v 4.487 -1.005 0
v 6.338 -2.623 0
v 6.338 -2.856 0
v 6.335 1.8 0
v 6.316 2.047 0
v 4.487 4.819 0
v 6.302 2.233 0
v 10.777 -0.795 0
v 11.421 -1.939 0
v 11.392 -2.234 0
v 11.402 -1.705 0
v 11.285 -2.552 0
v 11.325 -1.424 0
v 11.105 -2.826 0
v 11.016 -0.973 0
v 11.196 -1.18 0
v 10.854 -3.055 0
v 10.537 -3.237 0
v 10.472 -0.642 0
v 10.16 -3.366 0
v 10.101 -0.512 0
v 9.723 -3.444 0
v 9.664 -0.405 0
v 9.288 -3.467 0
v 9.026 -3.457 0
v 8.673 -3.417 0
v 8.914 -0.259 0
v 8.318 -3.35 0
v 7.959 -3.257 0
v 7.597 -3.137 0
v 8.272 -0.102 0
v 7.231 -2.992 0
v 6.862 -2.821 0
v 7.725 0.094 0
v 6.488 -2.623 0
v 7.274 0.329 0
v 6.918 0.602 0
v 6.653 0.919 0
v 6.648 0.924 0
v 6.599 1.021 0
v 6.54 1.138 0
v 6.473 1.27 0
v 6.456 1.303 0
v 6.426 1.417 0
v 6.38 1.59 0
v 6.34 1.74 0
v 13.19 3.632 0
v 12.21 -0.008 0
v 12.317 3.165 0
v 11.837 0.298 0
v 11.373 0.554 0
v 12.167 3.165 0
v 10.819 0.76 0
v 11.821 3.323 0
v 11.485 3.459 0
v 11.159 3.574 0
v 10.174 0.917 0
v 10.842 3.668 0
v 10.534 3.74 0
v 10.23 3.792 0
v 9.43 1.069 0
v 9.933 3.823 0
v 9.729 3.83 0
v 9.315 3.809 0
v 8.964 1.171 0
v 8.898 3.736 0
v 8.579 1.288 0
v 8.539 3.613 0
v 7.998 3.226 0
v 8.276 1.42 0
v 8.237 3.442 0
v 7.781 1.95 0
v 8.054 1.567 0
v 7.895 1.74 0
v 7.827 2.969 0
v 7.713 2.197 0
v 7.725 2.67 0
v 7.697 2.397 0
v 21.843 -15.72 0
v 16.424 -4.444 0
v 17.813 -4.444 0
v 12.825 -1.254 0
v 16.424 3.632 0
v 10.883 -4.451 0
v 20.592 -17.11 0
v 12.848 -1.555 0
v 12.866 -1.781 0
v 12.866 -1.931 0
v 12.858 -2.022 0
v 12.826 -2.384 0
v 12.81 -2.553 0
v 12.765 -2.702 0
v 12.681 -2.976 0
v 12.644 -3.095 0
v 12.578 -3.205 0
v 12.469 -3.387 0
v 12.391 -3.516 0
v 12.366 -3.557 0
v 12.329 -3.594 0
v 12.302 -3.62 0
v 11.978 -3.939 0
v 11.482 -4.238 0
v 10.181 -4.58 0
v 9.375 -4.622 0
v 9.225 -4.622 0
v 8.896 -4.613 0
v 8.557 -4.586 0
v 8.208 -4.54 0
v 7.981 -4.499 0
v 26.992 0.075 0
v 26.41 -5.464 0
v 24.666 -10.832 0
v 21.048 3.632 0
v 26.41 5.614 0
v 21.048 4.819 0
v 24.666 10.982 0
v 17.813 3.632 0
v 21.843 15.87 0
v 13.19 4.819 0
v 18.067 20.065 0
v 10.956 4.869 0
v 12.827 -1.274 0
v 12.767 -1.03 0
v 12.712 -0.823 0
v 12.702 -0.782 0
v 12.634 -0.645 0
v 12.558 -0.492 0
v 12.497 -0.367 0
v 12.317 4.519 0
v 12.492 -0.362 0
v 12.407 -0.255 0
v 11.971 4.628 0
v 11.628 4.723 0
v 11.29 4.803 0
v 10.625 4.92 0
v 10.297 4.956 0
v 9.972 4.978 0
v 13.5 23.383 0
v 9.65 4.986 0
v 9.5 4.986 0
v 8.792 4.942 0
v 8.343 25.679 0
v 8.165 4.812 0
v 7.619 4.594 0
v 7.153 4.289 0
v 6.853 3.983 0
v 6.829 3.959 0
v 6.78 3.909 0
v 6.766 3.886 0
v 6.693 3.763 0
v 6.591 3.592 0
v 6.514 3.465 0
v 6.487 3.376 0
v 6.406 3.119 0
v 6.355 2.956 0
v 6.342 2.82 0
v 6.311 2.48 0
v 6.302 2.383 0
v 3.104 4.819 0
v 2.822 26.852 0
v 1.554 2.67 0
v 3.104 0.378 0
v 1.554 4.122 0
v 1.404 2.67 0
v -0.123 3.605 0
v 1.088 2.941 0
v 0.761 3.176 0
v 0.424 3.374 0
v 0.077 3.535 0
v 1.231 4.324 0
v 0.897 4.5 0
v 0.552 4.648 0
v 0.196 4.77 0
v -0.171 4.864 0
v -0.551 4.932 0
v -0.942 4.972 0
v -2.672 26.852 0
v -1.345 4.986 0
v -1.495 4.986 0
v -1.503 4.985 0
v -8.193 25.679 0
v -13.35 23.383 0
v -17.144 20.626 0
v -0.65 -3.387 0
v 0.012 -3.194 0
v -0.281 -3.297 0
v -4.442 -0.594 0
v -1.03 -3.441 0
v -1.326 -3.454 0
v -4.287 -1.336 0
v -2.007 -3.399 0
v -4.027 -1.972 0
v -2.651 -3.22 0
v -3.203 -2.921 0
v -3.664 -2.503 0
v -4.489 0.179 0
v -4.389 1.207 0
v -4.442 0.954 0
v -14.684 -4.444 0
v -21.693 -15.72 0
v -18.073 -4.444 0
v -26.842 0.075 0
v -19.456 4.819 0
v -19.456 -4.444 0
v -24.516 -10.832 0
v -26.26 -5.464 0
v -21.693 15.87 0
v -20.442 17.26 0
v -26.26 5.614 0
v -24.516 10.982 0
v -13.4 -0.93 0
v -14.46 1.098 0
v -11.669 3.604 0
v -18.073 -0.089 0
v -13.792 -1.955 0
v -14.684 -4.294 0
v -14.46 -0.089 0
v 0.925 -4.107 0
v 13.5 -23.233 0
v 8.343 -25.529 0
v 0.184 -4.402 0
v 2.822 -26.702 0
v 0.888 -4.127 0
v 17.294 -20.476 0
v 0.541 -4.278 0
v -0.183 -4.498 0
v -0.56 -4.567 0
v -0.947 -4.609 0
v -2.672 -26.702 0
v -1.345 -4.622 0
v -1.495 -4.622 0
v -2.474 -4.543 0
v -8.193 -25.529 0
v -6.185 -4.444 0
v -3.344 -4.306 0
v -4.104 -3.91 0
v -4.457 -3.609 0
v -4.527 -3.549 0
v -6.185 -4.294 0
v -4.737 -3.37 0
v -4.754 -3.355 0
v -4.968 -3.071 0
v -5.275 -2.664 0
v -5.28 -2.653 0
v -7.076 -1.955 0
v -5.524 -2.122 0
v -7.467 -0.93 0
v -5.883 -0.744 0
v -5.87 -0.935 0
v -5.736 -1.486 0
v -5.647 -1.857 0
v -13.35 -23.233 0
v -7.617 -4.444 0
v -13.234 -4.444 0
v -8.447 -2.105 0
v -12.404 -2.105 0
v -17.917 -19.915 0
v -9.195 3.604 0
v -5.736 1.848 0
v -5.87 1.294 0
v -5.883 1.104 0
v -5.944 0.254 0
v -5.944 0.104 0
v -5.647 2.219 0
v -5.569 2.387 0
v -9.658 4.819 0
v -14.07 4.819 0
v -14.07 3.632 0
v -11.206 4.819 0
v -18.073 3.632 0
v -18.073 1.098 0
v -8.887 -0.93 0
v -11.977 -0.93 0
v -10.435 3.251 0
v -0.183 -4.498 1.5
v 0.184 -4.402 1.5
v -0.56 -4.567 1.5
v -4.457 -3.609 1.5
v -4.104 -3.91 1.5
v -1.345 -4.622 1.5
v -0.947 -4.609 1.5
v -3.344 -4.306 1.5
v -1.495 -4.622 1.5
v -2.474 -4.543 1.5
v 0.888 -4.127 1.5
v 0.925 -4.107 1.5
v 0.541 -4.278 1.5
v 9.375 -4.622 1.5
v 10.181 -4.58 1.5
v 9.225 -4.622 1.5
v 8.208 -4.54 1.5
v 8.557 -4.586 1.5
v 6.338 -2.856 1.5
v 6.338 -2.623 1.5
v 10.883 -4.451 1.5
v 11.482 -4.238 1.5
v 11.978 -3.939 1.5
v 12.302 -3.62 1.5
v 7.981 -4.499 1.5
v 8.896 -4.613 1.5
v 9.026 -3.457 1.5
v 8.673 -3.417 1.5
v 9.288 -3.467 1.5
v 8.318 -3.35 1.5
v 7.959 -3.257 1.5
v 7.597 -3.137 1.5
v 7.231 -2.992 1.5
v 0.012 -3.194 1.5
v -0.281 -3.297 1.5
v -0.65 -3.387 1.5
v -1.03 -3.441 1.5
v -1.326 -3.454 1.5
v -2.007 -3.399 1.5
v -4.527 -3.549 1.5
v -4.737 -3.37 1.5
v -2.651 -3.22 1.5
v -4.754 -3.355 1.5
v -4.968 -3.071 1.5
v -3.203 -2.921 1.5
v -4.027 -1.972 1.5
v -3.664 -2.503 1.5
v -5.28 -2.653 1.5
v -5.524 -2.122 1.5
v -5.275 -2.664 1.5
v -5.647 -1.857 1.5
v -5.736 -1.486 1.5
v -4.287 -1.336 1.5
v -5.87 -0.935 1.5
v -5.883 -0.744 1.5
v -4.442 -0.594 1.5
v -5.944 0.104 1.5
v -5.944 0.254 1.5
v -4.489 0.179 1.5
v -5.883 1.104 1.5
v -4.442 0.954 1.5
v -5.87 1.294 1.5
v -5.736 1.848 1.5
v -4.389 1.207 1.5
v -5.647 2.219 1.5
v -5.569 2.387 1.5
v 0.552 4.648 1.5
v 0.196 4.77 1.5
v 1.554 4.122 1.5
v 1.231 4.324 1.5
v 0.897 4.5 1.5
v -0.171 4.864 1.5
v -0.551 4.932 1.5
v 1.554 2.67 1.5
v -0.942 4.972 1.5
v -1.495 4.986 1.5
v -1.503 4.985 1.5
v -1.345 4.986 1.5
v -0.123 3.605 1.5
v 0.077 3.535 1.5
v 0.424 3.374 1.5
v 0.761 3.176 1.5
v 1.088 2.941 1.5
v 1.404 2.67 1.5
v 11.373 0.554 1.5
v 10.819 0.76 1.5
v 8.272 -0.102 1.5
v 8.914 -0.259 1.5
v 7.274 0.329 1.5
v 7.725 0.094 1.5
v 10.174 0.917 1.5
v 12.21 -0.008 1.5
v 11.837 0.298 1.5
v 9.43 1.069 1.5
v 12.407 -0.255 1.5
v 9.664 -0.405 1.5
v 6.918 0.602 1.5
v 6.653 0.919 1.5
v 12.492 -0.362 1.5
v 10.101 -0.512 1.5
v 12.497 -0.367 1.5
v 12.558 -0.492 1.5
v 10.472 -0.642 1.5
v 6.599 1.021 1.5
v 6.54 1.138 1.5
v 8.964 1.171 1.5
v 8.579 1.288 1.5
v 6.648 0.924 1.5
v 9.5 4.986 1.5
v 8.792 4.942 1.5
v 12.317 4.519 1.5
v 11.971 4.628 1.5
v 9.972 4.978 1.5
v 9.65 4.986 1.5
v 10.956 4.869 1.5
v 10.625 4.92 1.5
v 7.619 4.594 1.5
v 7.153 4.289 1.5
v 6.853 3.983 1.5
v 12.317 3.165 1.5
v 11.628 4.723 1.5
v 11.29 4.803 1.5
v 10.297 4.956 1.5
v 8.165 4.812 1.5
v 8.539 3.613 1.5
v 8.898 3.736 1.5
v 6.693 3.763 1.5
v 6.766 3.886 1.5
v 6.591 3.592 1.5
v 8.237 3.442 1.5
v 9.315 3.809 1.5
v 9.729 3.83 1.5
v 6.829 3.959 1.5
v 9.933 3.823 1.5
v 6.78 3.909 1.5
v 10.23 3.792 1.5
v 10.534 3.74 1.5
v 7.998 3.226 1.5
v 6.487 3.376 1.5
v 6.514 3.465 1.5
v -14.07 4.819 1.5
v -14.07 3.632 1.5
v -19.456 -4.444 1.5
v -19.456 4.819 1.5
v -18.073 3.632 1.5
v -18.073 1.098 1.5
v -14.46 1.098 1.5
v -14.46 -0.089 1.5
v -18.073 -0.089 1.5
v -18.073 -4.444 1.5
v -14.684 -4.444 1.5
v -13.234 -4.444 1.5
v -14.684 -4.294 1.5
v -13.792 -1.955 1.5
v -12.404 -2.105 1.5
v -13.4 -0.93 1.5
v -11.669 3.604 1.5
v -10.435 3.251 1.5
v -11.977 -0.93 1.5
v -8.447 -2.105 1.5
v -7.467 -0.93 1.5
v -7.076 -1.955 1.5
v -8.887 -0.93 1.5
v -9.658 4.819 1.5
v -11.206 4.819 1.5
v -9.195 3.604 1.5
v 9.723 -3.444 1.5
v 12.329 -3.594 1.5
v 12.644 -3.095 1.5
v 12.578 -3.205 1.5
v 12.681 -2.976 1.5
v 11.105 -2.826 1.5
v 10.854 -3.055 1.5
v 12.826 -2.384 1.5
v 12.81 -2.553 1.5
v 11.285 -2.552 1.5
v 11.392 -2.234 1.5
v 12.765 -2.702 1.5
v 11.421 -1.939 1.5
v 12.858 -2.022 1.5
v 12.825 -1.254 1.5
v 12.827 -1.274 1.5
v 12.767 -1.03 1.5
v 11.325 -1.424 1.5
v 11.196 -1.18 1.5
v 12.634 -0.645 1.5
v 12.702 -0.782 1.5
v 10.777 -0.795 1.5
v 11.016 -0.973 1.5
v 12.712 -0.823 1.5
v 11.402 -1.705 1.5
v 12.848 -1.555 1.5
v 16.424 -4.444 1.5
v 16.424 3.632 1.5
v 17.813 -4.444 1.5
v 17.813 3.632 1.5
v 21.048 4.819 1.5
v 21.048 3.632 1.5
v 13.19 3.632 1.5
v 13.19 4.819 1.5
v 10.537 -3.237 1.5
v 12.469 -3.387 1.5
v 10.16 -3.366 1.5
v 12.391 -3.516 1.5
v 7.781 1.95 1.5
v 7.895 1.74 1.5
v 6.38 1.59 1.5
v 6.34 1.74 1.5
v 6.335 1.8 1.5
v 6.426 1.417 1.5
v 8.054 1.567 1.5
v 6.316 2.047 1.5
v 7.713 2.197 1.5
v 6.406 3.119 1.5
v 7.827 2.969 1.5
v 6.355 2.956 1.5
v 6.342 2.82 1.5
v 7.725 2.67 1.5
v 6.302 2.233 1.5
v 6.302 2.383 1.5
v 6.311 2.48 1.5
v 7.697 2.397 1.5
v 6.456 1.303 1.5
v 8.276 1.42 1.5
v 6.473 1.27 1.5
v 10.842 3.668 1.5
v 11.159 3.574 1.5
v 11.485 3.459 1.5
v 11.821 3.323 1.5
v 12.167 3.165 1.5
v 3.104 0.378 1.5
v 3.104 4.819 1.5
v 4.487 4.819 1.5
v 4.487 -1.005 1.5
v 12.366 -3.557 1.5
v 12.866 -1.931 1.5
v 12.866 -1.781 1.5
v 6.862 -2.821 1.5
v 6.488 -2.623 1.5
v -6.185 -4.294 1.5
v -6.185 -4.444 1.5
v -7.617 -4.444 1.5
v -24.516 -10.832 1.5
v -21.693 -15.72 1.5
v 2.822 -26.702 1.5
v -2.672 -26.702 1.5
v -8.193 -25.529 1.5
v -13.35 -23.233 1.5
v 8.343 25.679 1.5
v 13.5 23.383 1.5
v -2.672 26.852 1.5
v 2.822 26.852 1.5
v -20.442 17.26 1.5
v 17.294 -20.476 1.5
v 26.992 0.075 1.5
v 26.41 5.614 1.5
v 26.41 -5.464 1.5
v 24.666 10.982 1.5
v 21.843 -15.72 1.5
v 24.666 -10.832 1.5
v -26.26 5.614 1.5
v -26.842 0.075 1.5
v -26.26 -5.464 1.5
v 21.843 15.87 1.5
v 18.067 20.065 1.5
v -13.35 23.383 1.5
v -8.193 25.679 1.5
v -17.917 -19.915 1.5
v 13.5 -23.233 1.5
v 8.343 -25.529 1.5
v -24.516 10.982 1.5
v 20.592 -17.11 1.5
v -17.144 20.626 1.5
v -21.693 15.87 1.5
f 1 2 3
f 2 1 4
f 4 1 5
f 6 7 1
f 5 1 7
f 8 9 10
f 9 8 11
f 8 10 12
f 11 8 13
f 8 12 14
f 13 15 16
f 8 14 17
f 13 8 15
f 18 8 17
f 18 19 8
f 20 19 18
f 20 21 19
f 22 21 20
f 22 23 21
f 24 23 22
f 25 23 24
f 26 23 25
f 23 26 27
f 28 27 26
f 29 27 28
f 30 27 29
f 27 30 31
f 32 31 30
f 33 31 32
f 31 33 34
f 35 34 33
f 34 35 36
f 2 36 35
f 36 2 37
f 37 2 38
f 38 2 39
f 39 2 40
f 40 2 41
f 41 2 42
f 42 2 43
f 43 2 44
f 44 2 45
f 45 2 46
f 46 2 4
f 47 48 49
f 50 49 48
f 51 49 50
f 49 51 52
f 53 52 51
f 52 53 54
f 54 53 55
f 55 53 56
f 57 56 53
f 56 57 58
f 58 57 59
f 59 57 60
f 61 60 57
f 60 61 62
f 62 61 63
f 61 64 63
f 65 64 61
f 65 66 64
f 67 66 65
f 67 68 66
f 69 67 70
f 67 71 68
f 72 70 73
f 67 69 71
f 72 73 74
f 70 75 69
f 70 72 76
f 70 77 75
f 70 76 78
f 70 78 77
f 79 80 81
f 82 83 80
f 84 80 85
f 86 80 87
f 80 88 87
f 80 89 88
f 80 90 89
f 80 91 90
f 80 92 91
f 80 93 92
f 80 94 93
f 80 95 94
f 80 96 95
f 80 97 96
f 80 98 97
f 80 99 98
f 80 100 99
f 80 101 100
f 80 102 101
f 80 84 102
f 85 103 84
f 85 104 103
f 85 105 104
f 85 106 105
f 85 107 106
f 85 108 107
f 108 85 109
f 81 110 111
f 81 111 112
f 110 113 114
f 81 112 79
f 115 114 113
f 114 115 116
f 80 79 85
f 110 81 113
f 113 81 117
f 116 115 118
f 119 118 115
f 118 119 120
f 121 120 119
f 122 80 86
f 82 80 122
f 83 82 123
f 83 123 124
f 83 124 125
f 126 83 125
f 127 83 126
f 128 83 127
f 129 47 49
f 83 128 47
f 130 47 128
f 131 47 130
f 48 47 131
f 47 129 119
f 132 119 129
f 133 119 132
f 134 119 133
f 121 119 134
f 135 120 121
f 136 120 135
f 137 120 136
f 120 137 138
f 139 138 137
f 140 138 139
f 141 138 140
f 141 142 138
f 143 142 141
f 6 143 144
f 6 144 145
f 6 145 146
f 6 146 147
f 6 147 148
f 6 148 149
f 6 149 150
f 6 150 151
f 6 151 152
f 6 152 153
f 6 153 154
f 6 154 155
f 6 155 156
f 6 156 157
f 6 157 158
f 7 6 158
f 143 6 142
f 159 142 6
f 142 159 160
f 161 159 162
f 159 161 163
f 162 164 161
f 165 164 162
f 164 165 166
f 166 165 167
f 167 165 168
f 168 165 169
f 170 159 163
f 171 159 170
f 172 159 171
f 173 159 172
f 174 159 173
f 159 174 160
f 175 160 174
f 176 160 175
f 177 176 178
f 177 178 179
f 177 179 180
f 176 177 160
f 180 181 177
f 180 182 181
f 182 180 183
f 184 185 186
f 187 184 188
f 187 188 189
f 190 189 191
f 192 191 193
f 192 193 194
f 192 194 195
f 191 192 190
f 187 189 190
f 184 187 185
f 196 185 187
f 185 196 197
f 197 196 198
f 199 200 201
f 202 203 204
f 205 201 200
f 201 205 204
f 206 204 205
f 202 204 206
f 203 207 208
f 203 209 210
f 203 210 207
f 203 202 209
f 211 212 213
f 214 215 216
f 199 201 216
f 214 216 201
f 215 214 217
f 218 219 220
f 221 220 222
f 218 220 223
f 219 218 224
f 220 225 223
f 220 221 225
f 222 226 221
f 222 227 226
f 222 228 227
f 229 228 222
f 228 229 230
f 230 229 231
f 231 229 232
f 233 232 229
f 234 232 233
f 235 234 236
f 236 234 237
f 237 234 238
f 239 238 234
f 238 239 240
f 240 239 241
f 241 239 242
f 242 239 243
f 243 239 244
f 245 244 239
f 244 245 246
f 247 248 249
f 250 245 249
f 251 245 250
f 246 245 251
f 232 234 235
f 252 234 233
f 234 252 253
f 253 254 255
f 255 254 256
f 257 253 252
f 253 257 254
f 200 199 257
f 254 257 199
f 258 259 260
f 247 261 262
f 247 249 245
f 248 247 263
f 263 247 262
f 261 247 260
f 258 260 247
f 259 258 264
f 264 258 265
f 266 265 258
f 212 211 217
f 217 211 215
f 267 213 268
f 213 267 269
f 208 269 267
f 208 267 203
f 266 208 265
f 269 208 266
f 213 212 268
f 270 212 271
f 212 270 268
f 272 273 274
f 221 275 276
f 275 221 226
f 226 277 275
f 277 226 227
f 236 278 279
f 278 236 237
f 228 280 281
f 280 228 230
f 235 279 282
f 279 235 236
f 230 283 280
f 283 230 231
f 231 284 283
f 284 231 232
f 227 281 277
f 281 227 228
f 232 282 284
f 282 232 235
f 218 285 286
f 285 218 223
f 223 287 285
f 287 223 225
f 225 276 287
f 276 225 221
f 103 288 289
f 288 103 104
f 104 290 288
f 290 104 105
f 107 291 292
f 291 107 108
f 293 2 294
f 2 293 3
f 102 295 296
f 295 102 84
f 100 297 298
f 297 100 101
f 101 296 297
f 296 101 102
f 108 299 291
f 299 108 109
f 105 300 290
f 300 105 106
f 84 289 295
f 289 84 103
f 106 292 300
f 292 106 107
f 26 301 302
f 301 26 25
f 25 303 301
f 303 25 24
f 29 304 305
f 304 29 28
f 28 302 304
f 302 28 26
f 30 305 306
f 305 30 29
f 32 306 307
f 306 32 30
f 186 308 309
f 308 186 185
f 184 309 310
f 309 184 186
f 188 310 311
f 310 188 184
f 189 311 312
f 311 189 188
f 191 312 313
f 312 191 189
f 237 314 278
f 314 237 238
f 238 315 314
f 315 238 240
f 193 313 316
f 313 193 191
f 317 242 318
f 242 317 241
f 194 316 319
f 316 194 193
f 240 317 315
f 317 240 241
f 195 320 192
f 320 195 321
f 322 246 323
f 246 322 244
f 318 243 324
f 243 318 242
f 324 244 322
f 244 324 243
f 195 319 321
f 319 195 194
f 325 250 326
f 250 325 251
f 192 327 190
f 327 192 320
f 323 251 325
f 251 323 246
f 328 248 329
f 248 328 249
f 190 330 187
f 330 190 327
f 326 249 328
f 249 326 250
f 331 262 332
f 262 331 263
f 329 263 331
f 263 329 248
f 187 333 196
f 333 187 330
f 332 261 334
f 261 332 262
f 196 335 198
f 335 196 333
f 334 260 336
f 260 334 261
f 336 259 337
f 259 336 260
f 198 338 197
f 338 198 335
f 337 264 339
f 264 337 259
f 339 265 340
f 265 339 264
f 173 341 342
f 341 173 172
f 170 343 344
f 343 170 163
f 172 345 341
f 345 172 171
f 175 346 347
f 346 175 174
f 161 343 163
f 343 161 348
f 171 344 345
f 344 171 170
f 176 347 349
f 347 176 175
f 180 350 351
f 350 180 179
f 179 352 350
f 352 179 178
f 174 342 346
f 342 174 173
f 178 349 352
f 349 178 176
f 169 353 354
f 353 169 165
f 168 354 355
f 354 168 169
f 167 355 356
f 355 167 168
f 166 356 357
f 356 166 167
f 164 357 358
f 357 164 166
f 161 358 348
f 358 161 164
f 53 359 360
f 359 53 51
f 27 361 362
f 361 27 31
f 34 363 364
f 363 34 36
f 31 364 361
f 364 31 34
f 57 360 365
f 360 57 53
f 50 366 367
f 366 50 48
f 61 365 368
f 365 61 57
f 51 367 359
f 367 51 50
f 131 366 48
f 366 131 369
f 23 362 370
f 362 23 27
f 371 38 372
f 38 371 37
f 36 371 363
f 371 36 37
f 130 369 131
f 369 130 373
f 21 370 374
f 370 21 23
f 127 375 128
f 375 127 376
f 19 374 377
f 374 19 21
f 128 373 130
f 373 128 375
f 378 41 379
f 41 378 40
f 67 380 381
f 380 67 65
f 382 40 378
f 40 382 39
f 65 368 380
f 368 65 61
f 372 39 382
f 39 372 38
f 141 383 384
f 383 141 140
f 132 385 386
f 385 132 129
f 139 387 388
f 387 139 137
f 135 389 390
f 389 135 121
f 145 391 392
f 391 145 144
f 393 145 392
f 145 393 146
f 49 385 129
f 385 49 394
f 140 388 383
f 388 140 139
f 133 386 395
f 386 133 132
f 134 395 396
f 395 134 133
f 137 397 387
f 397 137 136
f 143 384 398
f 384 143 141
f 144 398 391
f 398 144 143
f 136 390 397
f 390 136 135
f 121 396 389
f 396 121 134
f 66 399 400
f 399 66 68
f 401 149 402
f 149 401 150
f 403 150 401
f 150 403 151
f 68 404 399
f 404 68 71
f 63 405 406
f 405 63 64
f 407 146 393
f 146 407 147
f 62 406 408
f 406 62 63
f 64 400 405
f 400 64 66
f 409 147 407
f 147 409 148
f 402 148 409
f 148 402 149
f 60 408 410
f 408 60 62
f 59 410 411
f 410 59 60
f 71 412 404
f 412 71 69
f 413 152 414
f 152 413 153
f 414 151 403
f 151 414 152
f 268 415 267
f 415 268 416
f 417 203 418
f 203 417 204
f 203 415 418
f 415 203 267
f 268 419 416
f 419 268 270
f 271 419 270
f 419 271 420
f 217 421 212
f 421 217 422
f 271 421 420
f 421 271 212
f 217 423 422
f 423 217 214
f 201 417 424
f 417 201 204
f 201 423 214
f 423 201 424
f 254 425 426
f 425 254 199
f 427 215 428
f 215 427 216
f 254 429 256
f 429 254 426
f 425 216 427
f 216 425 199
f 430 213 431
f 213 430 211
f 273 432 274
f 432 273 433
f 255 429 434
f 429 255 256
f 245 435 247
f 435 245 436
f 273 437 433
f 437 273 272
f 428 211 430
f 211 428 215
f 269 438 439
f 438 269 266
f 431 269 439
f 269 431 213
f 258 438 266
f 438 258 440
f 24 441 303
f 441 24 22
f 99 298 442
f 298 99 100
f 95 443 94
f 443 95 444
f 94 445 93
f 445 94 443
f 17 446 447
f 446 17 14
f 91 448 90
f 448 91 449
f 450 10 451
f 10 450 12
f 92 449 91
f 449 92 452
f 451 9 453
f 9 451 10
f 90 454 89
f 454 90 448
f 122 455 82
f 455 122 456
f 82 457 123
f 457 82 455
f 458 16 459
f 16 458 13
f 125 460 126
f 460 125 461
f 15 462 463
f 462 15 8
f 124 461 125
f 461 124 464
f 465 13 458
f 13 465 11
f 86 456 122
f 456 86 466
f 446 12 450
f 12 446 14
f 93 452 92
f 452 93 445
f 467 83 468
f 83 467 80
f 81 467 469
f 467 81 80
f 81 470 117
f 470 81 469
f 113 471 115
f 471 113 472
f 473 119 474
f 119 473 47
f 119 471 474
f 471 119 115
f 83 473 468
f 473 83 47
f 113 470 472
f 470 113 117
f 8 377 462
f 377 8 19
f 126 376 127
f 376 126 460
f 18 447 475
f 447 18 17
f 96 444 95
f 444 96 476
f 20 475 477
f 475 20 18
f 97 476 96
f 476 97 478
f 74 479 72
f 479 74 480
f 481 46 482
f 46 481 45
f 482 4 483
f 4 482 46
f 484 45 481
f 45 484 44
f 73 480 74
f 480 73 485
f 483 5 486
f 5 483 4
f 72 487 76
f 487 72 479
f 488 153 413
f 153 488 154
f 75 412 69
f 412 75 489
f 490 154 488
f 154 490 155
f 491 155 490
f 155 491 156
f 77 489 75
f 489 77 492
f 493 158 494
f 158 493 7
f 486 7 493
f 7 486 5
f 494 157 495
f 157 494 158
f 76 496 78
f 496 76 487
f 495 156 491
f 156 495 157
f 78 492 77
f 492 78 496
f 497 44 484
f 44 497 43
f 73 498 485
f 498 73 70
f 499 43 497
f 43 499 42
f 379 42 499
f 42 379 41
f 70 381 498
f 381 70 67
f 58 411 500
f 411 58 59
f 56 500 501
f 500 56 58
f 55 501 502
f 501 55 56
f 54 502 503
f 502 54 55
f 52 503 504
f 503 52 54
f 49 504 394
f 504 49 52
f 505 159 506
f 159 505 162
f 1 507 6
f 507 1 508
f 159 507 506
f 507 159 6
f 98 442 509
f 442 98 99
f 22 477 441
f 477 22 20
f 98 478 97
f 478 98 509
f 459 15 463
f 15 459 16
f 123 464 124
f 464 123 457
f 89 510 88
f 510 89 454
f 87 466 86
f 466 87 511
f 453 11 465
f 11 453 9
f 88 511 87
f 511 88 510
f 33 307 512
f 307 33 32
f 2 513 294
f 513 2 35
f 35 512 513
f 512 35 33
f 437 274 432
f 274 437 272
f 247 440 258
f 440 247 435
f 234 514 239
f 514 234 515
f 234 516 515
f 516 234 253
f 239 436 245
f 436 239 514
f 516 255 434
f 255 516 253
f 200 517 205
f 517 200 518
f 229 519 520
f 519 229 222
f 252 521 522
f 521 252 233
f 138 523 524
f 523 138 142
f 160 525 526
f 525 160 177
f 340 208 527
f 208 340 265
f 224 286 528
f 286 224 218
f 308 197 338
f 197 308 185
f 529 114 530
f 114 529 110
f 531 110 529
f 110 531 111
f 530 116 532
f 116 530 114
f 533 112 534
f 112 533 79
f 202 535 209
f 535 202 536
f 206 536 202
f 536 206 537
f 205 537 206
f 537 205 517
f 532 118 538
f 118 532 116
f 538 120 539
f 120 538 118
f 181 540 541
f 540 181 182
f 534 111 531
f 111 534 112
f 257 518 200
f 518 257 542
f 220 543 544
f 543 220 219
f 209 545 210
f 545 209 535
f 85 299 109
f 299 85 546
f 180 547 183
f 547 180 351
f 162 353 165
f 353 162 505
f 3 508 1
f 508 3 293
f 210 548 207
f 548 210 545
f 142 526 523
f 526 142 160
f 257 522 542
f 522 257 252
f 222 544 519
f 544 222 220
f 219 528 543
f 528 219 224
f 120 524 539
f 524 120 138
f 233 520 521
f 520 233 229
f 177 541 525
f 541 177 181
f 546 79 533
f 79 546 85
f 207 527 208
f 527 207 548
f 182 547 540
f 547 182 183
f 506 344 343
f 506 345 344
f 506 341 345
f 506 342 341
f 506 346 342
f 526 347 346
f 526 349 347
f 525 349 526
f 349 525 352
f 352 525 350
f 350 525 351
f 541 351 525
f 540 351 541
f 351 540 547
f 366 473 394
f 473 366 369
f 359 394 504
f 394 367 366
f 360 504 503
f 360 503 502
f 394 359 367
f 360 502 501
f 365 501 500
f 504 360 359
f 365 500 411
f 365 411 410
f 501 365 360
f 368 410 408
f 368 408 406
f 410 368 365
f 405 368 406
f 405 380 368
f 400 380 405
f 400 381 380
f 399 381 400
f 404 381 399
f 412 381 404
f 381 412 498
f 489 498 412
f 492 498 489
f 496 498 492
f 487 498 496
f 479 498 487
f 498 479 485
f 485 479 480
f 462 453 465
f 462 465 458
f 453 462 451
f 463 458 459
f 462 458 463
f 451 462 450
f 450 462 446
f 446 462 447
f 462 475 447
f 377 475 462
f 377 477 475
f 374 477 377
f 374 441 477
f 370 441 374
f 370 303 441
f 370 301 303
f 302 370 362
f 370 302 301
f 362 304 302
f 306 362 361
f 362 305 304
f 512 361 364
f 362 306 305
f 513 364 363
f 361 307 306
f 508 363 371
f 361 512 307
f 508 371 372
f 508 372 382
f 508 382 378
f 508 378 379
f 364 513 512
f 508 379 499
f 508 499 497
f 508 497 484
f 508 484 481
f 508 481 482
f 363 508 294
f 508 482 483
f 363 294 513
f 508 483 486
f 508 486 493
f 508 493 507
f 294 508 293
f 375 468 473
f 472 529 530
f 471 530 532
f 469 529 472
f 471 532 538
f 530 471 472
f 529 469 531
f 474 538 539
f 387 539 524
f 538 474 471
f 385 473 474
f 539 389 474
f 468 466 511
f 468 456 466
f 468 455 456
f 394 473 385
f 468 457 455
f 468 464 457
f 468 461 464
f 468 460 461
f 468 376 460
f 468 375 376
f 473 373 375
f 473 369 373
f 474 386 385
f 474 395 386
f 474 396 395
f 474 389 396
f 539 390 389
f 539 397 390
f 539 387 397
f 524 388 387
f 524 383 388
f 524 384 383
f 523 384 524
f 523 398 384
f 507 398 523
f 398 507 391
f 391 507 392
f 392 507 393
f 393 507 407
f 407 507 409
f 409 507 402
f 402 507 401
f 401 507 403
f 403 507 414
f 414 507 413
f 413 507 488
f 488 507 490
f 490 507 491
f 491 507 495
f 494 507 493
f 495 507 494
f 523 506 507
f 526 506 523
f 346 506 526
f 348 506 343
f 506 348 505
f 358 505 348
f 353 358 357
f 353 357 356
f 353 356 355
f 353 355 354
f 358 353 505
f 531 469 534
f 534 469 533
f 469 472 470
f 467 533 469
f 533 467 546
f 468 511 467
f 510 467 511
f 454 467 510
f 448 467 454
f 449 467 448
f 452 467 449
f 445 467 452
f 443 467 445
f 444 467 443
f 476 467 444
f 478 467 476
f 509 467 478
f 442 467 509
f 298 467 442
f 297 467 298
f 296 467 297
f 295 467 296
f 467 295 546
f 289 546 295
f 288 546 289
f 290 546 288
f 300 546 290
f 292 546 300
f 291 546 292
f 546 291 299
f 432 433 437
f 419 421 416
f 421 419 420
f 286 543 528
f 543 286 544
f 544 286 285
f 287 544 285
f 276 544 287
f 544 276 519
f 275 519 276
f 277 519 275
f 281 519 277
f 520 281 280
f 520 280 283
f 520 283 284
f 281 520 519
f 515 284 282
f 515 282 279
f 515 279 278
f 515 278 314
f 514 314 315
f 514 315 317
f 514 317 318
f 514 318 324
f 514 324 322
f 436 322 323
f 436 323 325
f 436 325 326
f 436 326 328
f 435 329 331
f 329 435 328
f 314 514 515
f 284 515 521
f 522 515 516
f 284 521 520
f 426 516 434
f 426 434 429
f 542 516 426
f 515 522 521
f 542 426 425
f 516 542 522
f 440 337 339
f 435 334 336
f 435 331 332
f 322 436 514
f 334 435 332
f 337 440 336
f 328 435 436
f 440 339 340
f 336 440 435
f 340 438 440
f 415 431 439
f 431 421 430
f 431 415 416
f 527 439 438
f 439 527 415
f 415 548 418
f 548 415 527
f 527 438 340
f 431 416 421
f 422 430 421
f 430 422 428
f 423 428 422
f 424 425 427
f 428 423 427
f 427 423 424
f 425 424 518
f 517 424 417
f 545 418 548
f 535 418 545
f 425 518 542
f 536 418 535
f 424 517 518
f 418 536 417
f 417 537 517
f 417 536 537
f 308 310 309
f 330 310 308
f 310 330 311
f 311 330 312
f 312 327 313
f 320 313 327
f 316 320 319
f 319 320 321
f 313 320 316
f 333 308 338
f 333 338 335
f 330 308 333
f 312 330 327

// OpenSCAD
difference() {
	cylinder(h = 1.5, r = 27.0);
	minkowski() {
		linear_extrude(height = 2.25) {
			text(font = "Mic 32Bold", halign = "center", size = 9, text = "FACIST", valign = "center");
		}
		cube(size = [0.15, 0.15, 0.15]);
	}
	minkowski() {
		union() {
			difference() {
				cylinder(h = 3.0, r = 31.5);
				cylinder(h = 3.0, r = 27.0);
			}
			rotate(a = [0, 0, -45]) {
				translate(v = [-29.25, 0, 0]) {
					translate(v = [0, -2.25, 0]) {
						cube(size = [58.5, 4.5, 3.0]);
					}
				}
			}
		}
		cube(size = [0.15, 0.15, 0.15]);
	}
}
